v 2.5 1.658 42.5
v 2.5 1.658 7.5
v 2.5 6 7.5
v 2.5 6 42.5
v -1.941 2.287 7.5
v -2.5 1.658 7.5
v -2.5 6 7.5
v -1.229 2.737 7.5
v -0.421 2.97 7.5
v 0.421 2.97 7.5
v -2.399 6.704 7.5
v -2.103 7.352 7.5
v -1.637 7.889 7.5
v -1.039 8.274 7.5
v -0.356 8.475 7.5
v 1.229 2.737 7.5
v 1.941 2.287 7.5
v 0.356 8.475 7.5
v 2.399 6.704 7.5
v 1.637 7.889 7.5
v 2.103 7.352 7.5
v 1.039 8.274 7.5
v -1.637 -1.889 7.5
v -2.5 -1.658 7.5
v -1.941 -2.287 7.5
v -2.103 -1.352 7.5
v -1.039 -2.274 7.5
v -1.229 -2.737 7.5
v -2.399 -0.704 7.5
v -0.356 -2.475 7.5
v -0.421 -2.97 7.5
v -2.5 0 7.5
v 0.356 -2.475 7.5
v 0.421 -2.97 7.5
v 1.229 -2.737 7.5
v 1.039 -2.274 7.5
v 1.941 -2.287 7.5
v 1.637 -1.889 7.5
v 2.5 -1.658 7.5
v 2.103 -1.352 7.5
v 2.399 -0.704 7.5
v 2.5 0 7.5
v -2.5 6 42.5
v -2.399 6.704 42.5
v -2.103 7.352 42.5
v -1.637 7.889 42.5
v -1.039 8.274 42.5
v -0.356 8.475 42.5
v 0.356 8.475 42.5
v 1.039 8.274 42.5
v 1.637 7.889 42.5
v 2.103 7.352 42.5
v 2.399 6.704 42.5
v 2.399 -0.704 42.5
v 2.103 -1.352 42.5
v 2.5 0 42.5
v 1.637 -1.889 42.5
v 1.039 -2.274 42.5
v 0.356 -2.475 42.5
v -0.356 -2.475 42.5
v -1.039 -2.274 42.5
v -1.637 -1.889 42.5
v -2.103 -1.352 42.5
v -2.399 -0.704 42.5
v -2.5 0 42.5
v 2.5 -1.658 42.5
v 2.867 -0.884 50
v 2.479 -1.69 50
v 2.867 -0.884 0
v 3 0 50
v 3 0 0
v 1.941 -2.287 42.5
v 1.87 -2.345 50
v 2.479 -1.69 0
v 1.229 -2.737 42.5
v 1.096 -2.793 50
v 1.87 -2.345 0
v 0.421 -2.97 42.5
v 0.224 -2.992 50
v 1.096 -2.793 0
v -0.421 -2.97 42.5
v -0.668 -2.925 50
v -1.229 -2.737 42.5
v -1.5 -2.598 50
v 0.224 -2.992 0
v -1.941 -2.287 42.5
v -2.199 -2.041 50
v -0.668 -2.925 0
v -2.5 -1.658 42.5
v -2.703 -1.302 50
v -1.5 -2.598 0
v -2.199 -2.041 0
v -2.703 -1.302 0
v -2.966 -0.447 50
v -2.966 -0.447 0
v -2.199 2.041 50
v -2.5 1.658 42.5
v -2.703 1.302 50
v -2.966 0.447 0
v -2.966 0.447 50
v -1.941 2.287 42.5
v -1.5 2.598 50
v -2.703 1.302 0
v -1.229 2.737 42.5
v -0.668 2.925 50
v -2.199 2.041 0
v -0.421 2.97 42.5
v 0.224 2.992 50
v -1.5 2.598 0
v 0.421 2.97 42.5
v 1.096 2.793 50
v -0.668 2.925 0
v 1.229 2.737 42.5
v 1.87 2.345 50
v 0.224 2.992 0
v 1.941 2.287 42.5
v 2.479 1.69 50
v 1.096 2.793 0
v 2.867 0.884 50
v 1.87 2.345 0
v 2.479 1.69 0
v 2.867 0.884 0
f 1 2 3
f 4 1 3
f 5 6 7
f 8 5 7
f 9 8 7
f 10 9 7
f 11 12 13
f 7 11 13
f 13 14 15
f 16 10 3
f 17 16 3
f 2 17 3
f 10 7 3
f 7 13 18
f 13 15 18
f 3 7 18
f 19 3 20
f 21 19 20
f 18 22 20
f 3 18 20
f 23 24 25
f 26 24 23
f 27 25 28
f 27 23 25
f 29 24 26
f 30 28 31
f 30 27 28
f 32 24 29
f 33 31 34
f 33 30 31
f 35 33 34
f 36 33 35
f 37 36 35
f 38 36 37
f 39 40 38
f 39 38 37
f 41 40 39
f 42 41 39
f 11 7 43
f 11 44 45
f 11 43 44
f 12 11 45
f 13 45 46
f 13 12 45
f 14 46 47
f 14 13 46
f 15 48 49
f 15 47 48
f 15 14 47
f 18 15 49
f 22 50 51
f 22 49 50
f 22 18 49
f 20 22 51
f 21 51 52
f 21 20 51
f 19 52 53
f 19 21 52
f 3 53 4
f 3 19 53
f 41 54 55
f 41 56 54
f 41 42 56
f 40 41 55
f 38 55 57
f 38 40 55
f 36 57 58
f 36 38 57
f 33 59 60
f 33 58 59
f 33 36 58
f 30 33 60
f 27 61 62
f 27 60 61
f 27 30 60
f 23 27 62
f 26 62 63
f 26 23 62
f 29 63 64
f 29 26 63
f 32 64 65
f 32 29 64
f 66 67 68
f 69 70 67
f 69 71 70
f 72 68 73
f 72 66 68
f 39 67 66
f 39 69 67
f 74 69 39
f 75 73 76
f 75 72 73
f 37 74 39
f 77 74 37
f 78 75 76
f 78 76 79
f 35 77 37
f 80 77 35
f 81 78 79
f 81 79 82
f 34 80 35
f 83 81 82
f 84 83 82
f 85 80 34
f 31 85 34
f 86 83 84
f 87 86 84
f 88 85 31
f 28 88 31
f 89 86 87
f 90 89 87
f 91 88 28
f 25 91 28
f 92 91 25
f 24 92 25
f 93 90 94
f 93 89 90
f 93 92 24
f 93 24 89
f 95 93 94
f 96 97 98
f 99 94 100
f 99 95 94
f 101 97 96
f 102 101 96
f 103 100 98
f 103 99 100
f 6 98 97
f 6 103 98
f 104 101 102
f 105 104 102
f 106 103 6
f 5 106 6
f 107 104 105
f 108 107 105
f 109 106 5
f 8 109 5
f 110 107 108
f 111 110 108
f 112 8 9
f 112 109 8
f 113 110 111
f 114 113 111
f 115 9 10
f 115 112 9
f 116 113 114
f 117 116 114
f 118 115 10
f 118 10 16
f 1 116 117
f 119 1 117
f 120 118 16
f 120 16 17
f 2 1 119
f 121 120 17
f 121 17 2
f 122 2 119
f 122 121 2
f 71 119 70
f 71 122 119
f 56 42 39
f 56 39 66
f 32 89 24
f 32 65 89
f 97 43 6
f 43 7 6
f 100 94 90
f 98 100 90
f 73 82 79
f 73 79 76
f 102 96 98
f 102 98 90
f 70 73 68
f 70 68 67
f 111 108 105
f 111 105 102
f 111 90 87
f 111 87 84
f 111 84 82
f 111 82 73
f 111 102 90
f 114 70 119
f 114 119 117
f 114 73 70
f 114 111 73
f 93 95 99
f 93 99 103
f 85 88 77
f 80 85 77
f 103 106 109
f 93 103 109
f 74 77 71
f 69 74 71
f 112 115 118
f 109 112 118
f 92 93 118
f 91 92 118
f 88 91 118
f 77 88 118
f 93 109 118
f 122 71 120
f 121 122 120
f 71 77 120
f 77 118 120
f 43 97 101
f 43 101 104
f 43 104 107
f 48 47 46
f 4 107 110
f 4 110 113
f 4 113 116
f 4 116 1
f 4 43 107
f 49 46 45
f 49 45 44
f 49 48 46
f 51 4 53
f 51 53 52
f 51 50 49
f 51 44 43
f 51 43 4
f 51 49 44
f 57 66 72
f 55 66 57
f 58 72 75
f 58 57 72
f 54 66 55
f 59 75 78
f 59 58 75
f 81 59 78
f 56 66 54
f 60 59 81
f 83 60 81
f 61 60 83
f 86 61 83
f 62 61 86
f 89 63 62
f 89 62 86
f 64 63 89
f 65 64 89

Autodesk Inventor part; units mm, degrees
ref_plane "YZ Plane" through (0, 0, 0) normal (1, 0, 0) x (0, 1, 0)
ref_plane "XZ Plane" through (0, 0, 0) normal (0, 1, 0) x (-1, 0, 0)
ref_plane "XY Plane" through (0, 0, 0) normal (0, 0, 1) x (1, 0, 0)
sketch "Эскиз4" plane through (0, 0, 0) normal (0, 0, 1) x (1, 0, 0)
  circle A0 centre (0, 0) radius 3
  dimension "d8" = 6
extrude "Выдавливание3" add sketch "Эскиз4" along normal blind 50
sketch "Эскиз5" plane through (0, 0, 0) normal (0, 1, 0) x (-1, 0, 0)
  line L0 (0, 0) -> (0, 25)
  line L1 (-2.5, 42.5) -> (2.5, 42.5)
  line L2 (2.5, 42.5) -> (2.5, 7.5)
  line L3 (2.5, 7.5) -> (-2.5, 7.5)
  line L4 (-2.5, 7.5) -> (-2.5, 42.5)
  line L5 (-2.5, 42.5) -> (2.5, 7.5) construction
  line L6 (2.5, 42.5) -> (-2.5, 7.5) construction
  dimension "d11" = 25
  dimension "d12" = 5
  dimension "d13" = 35
extrude "Выдавливание4" cut sketch "Эскиз5" against normal mid plane 50
sketch "Эскиз6" plane through (0, 0, 42.5) normal (0, 0, -1) x (-1, 0, 0)
  point P0 (0, 0)
sketch "Эскиз7" plane through (0, 0, 7.5) normal (0, 0, 1) x (1, 0, 0)
  circle A0 centre (0, 0) radius 3
  line L0 (0, 0) -> (0, 6) construction
  arc A1 (2.5, 1.6583) -> (-2.5, 1.6583) centre (0, 0) ccw projected
  line L1 (2.5, 0) -> (2.5, 6)
  line L2 (-2.5, 6) -> (-2.5, 0)
  arc A2 (-2.5, 0) -> (2.5, 0) centre (0, 0) ccw
  arc A3 (2.5, 6) -> (-2.5, 6) centre (0, 6) ccw
  point P0 (1, 1)
  point P1 (0, 3)
  dimension "d16" = 3
  dimension "d17" = 5
extrude "Выдавливание5" add sketch "Эскиз7" along normal blind 35 contours L1 A2 L2 A0 | A0 L2 A3 L1 picked at (0, 1)
properties part number "ведущий вал"
